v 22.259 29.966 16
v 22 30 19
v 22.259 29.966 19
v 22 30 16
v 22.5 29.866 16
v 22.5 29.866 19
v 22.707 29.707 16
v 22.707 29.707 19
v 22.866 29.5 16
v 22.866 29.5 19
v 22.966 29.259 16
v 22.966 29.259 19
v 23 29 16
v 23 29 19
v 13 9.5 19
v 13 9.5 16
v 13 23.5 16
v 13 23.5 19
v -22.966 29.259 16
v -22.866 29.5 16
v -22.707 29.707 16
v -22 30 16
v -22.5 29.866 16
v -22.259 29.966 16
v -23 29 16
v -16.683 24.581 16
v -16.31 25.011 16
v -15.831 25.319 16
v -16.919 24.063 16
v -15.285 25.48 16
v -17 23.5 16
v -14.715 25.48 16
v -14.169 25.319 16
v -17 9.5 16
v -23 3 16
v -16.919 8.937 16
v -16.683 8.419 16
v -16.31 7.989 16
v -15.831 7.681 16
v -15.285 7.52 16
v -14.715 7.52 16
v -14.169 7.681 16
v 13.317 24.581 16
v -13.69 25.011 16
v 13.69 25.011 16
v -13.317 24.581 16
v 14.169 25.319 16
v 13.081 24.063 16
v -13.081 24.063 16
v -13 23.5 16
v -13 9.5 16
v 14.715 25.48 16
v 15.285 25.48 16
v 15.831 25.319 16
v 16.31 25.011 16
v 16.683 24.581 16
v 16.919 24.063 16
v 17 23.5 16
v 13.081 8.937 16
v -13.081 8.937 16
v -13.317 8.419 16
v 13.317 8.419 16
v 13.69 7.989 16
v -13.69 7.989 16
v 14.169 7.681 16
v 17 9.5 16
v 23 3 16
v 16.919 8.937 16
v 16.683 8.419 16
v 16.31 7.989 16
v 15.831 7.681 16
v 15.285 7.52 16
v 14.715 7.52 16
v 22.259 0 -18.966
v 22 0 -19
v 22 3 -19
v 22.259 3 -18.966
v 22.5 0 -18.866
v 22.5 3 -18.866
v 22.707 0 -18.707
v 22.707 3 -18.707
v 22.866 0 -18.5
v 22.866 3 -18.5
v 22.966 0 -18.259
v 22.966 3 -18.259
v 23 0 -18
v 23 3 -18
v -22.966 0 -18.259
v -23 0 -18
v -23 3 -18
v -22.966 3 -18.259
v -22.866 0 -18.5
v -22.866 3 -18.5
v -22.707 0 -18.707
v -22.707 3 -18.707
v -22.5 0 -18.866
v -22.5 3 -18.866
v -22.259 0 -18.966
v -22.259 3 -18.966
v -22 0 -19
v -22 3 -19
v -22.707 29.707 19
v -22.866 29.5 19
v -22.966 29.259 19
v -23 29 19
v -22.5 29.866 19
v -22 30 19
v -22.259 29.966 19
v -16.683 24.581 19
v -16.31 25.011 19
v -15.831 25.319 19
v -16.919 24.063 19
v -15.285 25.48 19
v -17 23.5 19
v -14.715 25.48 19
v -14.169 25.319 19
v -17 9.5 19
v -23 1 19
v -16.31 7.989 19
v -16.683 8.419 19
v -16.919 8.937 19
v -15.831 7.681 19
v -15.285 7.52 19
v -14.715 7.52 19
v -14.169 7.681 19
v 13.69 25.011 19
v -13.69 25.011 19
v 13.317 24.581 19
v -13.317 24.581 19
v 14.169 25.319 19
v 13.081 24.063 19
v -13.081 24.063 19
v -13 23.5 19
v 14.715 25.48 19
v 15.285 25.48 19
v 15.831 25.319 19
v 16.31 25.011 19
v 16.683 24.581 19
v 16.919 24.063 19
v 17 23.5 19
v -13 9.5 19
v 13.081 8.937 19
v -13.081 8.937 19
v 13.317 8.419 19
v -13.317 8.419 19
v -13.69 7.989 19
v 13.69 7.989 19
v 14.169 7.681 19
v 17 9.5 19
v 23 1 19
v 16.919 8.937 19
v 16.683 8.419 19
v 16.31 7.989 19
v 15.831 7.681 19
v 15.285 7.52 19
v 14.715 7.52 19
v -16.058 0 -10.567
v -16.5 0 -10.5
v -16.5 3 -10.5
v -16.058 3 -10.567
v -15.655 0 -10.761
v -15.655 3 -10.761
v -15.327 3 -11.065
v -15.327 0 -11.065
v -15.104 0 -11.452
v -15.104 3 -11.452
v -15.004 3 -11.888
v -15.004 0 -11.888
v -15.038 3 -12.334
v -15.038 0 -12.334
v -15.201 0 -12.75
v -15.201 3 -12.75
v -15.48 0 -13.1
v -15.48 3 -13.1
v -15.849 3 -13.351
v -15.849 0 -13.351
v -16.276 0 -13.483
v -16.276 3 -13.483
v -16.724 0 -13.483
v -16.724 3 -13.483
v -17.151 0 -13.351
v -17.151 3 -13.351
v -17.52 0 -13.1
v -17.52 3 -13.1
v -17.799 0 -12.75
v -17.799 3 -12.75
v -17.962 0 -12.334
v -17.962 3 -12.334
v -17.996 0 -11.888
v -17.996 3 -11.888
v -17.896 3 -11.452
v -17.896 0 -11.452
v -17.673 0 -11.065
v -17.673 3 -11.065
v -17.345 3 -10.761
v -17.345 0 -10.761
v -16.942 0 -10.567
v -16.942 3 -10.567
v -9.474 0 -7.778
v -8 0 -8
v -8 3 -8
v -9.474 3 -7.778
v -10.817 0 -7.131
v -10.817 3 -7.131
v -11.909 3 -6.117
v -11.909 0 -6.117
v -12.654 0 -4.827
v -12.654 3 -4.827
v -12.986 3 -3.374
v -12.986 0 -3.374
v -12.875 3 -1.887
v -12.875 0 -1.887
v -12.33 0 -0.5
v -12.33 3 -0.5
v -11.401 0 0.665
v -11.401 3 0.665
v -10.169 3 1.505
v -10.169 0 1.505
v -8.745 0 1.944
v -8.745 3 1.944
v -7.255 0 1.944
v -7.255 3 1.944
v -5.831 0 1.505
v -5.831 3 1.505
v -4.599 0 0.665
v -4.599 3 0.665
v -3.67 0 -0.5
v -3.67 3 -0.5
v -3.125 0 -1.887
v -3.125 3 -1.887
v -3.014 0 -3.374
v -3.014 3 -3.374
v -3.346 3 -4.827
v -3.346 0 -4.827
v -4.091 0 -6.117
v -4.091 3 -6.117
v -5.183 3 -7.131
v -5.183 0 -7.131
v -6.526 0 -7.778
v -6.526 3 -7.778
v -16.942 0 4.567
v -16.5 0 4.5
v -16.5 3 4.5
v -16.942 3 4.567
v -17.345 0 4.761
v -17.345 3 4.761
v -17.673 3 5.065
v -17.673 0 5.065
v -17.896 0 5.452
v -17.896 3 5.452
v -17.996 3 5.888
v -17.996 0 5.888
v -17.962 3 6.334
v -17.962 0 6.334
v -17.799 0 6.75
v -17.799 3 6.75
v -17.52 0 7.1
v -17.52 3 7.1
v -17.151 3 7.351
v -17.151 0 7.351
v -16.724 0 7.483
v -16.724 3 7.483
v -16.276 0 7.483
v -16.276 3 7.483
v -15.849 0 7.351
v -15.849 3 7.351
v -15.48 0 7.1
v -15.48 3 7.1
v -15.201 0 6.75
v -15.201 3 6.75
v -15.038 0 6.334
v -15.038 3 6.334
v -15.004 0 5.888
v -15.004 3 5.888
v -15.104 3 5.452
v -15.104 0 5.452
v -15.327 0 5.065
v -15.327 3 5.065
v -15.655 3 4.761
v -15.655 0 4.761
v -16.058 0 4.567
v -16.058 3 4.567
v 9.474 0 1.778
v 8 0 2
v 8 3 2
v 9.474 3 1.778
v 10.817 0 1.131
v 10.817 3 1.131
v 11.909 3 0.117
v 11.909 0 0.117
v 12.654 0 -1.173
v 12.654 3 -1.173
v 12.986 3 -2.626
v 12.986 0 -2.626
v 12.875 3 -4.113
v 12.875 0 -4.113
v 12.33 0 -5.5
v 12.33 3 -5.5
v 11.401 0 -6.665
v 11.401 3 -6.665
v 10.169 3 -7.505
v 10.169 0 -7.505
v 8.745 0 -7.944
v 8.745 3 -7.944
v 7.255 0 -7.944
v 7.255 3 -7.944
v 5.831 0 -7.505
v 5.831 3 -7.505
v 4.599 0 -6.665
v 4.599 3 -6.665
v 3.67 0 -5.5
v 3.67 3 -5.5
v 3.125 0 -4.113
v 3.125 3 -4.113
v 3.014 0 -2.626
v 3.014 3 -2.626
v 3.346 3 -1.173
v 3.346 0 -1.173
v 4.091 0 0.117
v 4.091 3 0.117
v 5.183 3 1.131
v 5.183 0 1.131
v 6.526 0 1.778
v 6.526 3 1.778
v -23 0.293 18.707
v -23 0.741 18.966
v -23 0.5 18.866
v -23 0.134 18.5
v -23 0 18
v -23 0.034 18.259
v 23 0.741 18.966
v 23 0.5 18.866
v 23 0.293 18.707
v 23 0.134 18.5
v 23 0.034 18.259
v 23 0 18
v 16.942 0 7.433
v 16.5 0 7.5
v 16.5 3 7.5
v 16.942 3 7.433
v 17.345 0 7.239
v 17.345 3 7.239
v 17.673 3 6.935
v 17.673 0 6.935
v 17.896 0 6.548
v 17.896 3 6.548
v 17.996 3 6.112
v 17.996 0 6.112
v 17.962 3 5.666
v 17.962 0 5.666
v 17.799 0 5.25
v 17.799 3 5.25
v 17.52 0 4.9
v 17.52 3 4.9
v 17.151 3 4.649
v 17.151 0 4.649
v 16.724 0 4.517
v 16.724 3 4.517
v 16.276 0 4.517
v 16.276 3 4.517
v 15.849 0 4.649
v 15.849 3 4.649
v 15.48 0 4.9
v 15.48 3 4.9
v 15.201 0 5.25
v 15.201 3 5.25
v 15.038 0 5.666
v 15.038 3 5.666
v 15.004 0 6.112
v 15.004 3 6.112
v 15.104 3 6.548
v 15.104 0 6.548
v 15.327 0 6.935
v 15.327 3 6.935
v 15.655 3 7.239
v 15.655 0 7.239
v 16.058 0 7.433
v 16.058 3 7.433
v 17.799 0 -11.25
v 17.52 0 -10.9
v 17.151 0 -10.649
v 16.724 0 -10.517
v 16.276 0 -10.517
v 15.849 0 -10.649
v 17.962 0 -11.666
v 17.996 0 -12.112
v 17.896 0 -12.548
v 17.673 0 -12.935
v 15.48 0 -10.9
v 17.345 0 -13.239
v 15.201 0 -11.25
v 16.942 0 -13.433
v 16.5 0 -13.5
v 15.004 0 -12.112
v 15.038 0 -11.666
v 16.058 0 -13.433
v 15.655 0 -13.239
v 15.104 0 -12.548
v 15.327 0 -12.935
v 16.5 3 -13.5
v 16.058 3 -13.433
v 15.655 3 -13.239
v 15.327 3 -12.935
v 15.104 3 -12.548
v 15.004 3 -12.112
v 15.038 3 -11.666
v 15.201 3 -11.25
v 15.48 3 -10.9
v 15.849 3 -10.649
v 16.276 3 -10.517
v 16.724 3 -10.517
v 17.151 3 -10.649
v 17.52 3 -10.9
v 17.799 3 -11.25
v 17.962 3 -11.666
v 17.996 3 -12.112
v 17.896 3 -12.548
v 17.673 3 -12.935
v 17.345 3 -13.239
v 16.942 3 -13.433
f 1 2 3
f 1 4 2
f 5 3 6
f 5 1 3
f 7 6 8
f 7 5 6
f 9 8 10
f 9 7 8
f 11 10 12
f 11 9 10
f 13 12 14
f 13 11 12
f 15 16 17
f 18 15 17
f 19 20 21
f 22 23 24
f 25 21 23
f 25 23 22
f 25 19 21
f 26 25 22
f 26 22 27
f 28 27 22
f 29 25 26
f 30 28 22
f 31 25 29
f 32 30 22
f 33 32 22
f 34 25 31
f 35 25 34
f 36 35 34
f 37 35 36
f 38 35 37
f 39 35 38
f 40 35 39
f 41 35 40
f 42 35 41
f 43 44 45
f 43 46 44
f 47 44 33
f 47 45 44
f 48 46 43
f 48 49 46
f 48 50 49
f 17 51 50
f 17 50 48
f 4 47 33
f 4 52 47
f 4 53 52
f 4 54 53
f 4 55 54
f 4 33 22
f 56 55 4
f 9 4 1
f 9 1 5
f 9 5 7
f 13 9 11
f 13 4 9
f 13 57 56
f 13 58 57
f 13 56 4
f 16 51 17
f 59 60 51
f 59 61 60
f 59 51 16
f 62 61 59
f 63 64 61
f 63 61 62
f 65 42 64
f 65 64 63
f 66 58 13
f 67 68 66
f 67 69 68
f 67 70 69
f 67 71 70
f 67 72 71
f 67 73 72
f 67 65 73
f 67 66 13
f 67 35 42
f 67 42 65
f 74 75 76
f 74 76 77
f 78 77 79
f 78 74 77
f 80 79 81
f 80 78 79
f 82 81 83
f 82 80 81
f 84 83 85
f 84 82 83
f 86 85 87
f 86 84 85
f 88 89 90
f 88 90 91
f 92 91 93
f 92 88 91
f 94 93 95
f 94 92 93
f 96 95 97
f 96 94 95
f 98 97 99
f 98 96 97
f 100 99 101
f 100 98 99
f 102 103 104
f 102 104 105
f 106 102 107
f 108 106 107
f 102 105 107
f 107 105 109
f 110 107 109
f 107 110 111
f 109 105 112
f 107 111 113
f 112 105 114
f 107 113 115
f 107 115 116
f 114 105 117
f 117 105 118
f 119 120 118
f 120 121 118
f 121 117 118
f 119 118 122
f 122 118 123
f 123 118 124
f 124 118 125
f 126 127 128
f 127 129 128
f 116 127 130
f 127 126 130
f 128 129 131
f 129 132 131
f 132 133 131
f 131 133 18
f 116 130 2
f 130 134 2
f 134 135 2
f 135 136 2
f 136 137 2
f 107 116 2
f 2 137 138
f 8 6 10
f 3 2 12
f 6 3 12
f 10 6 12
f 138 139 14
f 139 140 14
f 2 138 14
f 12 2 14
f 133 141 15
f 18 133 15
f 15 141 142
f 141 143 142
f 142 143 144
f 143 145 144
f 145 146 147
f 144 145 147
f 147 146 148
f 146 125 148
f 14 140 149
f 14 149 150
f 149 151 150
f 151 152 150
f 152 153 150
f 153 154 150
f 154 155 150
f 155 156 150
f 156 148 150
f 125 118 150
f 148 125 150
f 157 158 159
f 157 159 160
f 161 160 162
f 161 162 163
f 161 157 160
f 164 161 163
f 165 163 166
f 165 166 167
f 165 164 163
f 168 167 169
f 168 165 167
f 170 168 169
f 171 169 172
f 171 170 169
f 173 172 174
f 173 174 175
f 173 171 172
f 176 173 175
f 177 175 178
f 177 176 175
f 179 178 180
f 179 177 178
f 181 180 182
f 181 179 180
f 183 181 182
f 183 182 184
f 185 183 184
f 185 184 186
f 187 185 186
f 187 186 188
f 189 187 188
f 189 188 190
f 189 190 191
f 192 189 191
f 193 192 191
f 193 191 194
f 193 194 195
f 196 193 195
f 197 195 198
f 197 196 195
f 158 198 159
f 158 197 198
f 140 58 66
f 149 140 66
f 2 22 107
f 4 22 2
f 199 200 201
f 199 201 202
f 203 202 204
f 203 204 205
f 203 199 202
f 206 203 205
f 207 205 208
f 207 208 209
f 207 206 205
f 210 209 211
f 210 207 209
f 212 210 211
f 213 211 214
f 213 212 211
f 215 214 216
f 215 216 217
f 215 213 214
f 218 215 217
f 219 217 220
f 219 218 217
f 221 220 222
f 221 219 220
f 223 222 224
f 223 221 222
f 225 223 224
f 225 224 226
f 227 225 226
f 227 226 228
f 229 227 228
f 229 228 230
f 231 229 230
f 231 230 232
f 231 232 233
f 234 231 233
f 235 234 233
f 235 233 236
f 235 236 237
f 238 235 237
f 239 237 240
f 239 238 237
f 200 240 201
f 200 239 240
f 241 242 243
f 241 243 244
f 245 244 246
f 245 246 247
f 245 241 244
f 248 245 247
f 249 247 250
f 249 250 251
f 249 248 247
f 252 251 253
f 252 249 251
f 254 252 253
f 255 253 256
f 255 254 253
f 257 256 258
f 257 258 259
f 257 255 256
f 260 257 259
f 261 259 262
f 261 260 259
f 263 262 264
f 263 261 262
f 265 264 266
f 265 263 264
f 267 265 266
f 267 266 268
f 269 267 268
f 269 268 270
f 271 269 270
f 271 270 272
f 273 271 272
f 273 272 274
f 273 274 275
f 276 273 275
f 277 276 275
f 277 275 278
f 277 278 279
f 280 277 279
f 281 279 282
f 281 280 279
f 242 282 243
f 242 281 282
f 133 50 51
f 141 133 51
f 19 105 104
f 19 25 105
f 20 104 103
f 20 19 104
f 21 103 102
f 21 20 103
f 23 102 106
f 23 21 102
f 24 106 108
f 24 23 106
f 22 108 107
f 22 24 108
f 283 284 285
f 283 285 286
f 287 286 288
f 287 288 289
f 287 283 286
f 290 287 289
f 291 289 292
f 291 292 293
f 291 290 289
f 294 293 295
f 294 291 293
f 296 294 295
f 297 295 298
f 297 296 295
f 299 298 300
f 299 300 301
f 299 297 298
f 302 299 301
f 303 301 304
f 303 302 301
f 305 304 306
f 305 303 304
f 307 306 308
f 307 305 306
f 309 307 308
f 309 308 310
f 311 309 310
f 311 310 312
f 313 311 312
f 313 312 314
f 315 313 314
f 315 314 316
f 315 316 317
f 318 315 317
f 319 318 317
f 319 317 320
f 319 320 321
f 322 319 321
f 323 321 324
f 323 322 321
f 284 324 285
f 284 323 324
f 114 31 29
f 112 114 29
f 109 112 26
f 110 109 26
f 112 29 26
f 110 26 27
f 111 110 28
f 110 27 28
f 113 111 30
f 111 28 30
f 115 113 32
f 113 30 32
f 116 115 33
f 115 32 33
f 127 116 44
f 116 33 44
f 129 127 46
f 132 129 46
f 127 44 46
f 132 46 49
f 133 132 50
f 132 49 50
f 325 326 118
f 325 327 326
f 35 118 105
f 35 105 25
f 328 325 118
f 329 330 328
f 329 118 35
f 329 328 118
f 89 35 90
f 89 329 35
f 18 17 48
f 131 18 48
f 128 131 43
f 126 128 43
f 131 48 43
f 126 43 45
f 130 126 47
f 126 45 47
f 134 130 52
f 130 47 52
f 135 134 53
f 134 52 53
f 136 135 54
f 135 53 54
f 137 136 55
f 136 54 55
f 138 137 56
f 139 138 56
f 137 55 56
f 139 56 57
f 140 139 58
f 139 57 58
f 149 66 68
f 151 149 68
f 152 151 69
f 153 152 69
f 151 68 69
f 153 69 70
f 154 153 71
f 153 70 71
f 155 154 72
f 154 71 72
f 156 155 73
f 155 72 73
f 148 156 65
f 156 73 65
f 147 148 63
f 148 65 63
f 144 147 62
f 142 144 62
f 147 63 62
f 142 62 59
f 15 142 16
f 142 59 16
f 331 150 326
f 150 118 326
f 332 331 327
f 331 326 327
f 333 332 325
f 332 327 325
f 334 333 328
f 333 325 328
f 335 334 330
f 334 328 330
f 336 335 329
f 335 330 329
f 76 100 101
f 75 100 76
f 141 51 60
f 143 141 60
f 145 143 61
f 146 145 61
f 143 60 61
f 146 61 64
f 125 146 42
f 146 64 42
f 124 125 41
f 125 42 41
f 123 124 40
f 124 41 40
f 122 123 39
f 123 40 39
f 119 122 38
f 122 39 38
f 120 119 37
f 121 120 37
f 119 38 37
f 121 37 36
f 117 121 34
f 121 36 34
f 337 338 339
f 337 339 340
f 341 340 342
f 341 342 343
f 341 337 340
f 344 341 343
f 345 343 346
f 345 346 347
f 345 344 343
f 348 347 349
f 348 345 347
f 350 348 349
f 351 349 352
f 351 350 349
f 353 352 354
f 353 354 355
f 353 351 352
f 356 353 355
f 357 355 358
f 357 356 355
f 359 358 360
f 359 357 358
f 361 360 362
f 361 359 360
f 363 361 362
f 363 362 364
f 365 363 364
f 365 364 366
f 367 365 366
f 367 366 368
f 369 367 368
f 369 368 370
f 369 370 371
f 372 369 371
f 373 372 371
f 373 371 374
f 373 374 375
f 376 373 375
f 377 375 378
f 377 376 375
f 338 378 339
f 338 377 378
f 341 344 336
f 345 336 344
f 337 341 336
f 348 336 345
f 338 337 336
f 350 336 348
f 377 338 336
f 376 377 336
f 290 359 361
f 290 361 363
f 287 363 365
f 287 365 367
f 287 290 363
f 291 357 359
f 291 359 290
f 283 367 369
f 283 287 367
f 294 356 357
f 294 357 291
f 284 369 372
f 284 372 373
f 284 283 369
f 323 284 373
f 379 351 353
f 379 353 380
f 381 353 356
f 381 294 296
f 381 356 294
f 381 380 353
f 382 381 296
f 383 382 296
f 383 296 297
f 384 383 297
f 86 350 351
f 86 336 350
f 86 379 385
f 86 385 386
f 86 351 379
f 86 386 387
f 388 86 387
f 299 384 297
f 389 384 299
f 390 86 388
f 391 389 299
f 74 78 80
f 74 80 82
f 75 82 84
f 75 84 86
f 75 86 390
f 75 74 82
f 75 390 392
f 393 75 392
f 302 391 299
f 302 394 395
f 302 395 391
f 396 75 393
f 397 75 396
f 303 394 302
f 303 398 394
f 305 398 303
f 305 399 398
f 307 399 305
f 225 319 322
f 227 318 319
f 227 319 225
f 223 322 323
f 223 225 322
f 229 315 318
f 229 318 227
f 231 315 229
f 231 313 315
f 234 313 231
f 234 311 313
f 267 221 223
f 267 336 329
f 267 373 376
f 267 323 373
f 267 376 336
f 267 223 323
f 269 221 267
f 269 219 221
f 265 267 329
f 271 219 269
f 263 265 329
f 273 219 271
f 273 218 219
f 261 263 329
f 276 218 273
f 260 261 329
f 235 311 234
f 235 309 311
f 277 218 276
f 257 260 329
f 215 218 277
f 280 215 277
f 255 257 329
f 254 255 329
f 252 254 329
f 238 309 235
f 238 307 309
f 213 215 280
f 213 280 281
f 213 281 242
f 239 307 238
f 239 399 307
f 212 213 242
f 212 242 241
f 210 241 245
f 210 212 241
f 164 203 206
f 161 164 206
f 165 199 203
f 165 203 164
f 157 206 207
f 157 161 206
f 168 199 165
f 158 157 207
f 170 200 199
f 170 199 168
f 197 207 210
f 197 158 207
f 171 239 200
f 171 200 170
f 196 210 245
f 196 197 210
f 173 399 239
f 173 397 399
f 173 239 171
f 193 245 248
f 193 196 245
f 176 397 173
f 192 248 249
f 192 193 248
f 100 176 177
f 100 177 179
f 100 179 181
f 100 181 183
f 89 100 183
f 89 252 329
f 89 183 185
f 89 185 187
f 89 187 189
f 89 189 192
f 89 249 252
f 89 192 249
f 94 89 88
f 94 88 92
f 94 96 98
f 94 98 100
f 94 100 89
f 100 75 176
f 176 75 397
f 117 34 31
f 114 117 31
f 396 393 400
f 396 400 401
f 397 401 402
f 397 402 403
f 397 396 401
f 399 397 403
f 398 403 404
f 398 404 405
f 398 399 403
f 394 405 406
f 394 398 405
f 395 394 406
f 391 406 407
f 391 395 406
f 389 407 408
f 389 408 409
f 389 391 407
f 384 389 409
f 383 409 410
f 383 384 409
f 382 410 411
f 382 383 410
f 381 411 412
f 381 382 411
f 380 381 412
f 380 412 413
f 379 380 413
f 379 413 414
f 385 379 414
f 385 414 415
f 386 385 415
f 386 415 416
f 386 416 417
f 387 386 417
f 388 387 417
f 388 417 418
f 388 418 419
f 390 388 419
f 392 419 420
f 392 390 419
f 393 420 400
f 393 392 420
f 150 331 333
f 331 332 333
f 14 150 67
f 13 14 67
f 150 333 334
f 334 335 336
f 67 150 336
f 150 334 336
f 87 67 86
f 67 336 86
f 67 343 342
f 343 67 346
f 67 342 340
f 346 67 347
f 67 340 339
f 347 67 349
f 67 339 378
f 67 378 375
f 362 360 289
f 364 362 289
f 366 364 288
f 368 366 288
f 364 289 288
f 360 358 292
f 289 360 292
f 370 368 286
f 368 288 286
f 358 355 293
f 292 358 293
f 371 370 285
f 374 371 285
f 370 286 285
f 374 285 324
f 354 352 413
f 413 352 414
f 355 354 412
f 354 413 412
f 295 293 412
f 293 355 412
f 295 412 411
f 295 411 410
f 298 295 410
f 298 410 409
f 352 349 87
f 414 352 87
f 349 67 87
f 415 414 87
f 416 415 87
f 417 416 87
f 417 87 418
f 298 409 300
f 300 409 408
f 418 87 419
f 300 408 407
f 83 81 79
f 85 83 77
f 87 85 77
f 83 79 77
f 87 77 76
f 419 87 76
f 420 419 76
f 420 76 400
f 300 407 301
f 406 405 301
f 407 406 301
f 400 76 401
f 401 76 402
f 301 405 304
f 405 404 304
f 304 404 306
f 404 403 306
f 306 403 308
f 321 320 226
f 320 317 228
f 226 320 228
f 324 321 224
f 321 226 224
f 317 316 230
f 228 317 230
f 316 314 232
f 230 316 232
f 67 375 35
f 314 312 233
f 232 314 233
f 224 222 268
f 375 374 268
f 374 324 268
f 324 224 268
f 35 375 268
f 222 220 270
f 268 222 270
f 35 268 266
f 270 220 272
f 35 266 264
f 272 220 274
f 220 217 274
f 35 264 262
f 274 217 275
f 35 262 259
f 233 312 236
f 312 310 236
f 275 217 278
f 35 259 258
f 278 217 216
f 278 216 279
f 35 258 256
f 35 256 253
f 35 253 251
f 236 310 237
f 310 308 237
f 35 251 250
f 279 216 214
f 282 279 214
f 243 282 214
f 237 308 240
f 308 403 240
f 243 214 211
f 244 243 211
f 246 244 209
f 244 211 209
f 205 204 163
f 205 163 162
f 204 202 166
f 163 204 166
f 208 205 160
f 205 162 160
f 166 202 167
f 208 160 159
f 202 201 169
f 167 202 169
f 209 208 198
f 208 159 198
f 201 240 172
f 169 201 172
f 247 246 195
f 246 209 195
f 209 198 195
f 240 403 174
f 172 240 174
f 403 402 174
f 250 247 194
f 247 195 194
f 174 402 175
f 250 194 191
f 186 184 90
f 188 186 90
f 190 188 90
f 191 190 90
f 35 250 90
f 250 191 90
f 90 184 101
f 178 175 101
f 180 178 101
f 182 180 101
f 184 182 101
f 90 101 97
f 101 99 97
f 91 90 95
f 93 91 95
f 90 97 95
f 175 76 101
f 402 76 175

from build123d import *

# Parameters (mm, degrees)
SKETCH2_R           = 5
SKETCH2_R_2         = 1.5
BOSS_EXTRUDE1_DEPTH = 3
SKETCH3_W           = 46
SKETCH3_H           = 3
BOSS_EXTRUDE2_DEPTH = 27
CUT_EXTRUDE1_DEPTH  = 52.51698749
FILLET1_R           = 1
FILLET2_R           = 1


with BuildPart() as part:
    # Sketch2 → Boss-Extrude1 (new body)
    with BuildSketch(Plane(origin=(0, 0, 0), x_dir=(1, 0, 0), z_dir=(0, 1, 0))):
        with BuildLine():
            Line((-22, 19), (22, 19))
            ThreePointArc((22, 19), (22.707106781, 18.707106781), (23, 18))
            Line((23, 18), (23, -19))
            Line((23, -19), (-23, -19))
            Line((-23, -19), (-23, 18))
            ThreePointArc((-23, 18), (-22.707106781, 18.707106781), (-22, 19))
        make_face()
        with Locations(Location((8, 3, 0), (0, 0, 270))):
            Circle(SKETCH2_R, mode=Mode.SUBTRACT)
        with Locations(Location((-8, 3, 0), (0, 0, 90))):
            Circle(SKETCH2_R, mode=Mode.SUBTRACT)
        with Locations(Location((-16.5, 12, 0), (0, 0, 270))):
            Circle(SKETCH2_R_2, mode=Mode.SUBTRACT)
        with Locations(Location((-16.5, -6, 0), (0, 0, 90))):
            Circle(SKETCH2_R_2, mode=Mode.SUBTRACT)
        with Locations(Location((16.5, -6, 0), (0, 0, 270))):
            Circle(SKETCH2_R_2, mode=Mode.SUBTRACT)
        with Locations(Location((16.5, 12, 0), (0, 0, 90))):
            Circle(SKETCH2_R_2, mode=Mode.SUBTRACT)
    extrude(amount=BOSS_EXTRUDE1_DEPTH)

    # Sketch3 → Boss-Extrude2 (add)
    with BuildSketch(Plane(origin=(0, 3, 0), x_dir=(1, 0, 0), z_dir=(0, 1, 0))):
        with Locations((0, -17.5)):
            Rectangle(SKETCH3_W, SKETCH3_H)
    extrude(amount=BOSS_EXTRUDE2_DEPTH)

    # Sketch4 → Cut-Extrude1 (cut, through all)
    with BuildSketch(Plane(origin=(0, 0, 16), x_dir=(-1, 0, 0), z_dir=(0, 0, -1))):
        with BuildLine():
            Line((-17, 23.5), (-17, 9.5))
            ThreePointArc((-17, 9.5), (-15, 7.5), (-13, 9.5))
            Line((-13, 9.5), (-13, 23.5))
            ThreePointArc((-13, 23.5), (-15, 25.5), (-17, 23.5))
        make_face()
        with BuildLine():
            Line((13, 23.5), (13, 9.5))
            ThreePointArc((13, 9.5), (15, 7.5), (17, 9.5))
            Line((17, 9.5), (17, 23.5))
            ThreePointArc((17, 23.5), (15, 25.5), (13, 23.5))
        make_face()
    extrude(amount=-CUT_EXTRUDE1_DEPTH, mode=Mode.SUBTRACT)

    # Fillet1
    fillet1_edges = [part.edges().sort_by_distance(p)[0] for p in [
        (-23, 30, 17.5),
        (23, 30, 17.5),
    ]]
    fillet(fillet1_edges, radius=FILLET1_R)

    # Fillet2
    fillet2_edges = [part.edges().sort_by_distance(p)[0] for p in [
        (0, 0, 19),
    ]]
    fillet(fillet2_edges, radius=FILLET2_R)


solid = part.part
